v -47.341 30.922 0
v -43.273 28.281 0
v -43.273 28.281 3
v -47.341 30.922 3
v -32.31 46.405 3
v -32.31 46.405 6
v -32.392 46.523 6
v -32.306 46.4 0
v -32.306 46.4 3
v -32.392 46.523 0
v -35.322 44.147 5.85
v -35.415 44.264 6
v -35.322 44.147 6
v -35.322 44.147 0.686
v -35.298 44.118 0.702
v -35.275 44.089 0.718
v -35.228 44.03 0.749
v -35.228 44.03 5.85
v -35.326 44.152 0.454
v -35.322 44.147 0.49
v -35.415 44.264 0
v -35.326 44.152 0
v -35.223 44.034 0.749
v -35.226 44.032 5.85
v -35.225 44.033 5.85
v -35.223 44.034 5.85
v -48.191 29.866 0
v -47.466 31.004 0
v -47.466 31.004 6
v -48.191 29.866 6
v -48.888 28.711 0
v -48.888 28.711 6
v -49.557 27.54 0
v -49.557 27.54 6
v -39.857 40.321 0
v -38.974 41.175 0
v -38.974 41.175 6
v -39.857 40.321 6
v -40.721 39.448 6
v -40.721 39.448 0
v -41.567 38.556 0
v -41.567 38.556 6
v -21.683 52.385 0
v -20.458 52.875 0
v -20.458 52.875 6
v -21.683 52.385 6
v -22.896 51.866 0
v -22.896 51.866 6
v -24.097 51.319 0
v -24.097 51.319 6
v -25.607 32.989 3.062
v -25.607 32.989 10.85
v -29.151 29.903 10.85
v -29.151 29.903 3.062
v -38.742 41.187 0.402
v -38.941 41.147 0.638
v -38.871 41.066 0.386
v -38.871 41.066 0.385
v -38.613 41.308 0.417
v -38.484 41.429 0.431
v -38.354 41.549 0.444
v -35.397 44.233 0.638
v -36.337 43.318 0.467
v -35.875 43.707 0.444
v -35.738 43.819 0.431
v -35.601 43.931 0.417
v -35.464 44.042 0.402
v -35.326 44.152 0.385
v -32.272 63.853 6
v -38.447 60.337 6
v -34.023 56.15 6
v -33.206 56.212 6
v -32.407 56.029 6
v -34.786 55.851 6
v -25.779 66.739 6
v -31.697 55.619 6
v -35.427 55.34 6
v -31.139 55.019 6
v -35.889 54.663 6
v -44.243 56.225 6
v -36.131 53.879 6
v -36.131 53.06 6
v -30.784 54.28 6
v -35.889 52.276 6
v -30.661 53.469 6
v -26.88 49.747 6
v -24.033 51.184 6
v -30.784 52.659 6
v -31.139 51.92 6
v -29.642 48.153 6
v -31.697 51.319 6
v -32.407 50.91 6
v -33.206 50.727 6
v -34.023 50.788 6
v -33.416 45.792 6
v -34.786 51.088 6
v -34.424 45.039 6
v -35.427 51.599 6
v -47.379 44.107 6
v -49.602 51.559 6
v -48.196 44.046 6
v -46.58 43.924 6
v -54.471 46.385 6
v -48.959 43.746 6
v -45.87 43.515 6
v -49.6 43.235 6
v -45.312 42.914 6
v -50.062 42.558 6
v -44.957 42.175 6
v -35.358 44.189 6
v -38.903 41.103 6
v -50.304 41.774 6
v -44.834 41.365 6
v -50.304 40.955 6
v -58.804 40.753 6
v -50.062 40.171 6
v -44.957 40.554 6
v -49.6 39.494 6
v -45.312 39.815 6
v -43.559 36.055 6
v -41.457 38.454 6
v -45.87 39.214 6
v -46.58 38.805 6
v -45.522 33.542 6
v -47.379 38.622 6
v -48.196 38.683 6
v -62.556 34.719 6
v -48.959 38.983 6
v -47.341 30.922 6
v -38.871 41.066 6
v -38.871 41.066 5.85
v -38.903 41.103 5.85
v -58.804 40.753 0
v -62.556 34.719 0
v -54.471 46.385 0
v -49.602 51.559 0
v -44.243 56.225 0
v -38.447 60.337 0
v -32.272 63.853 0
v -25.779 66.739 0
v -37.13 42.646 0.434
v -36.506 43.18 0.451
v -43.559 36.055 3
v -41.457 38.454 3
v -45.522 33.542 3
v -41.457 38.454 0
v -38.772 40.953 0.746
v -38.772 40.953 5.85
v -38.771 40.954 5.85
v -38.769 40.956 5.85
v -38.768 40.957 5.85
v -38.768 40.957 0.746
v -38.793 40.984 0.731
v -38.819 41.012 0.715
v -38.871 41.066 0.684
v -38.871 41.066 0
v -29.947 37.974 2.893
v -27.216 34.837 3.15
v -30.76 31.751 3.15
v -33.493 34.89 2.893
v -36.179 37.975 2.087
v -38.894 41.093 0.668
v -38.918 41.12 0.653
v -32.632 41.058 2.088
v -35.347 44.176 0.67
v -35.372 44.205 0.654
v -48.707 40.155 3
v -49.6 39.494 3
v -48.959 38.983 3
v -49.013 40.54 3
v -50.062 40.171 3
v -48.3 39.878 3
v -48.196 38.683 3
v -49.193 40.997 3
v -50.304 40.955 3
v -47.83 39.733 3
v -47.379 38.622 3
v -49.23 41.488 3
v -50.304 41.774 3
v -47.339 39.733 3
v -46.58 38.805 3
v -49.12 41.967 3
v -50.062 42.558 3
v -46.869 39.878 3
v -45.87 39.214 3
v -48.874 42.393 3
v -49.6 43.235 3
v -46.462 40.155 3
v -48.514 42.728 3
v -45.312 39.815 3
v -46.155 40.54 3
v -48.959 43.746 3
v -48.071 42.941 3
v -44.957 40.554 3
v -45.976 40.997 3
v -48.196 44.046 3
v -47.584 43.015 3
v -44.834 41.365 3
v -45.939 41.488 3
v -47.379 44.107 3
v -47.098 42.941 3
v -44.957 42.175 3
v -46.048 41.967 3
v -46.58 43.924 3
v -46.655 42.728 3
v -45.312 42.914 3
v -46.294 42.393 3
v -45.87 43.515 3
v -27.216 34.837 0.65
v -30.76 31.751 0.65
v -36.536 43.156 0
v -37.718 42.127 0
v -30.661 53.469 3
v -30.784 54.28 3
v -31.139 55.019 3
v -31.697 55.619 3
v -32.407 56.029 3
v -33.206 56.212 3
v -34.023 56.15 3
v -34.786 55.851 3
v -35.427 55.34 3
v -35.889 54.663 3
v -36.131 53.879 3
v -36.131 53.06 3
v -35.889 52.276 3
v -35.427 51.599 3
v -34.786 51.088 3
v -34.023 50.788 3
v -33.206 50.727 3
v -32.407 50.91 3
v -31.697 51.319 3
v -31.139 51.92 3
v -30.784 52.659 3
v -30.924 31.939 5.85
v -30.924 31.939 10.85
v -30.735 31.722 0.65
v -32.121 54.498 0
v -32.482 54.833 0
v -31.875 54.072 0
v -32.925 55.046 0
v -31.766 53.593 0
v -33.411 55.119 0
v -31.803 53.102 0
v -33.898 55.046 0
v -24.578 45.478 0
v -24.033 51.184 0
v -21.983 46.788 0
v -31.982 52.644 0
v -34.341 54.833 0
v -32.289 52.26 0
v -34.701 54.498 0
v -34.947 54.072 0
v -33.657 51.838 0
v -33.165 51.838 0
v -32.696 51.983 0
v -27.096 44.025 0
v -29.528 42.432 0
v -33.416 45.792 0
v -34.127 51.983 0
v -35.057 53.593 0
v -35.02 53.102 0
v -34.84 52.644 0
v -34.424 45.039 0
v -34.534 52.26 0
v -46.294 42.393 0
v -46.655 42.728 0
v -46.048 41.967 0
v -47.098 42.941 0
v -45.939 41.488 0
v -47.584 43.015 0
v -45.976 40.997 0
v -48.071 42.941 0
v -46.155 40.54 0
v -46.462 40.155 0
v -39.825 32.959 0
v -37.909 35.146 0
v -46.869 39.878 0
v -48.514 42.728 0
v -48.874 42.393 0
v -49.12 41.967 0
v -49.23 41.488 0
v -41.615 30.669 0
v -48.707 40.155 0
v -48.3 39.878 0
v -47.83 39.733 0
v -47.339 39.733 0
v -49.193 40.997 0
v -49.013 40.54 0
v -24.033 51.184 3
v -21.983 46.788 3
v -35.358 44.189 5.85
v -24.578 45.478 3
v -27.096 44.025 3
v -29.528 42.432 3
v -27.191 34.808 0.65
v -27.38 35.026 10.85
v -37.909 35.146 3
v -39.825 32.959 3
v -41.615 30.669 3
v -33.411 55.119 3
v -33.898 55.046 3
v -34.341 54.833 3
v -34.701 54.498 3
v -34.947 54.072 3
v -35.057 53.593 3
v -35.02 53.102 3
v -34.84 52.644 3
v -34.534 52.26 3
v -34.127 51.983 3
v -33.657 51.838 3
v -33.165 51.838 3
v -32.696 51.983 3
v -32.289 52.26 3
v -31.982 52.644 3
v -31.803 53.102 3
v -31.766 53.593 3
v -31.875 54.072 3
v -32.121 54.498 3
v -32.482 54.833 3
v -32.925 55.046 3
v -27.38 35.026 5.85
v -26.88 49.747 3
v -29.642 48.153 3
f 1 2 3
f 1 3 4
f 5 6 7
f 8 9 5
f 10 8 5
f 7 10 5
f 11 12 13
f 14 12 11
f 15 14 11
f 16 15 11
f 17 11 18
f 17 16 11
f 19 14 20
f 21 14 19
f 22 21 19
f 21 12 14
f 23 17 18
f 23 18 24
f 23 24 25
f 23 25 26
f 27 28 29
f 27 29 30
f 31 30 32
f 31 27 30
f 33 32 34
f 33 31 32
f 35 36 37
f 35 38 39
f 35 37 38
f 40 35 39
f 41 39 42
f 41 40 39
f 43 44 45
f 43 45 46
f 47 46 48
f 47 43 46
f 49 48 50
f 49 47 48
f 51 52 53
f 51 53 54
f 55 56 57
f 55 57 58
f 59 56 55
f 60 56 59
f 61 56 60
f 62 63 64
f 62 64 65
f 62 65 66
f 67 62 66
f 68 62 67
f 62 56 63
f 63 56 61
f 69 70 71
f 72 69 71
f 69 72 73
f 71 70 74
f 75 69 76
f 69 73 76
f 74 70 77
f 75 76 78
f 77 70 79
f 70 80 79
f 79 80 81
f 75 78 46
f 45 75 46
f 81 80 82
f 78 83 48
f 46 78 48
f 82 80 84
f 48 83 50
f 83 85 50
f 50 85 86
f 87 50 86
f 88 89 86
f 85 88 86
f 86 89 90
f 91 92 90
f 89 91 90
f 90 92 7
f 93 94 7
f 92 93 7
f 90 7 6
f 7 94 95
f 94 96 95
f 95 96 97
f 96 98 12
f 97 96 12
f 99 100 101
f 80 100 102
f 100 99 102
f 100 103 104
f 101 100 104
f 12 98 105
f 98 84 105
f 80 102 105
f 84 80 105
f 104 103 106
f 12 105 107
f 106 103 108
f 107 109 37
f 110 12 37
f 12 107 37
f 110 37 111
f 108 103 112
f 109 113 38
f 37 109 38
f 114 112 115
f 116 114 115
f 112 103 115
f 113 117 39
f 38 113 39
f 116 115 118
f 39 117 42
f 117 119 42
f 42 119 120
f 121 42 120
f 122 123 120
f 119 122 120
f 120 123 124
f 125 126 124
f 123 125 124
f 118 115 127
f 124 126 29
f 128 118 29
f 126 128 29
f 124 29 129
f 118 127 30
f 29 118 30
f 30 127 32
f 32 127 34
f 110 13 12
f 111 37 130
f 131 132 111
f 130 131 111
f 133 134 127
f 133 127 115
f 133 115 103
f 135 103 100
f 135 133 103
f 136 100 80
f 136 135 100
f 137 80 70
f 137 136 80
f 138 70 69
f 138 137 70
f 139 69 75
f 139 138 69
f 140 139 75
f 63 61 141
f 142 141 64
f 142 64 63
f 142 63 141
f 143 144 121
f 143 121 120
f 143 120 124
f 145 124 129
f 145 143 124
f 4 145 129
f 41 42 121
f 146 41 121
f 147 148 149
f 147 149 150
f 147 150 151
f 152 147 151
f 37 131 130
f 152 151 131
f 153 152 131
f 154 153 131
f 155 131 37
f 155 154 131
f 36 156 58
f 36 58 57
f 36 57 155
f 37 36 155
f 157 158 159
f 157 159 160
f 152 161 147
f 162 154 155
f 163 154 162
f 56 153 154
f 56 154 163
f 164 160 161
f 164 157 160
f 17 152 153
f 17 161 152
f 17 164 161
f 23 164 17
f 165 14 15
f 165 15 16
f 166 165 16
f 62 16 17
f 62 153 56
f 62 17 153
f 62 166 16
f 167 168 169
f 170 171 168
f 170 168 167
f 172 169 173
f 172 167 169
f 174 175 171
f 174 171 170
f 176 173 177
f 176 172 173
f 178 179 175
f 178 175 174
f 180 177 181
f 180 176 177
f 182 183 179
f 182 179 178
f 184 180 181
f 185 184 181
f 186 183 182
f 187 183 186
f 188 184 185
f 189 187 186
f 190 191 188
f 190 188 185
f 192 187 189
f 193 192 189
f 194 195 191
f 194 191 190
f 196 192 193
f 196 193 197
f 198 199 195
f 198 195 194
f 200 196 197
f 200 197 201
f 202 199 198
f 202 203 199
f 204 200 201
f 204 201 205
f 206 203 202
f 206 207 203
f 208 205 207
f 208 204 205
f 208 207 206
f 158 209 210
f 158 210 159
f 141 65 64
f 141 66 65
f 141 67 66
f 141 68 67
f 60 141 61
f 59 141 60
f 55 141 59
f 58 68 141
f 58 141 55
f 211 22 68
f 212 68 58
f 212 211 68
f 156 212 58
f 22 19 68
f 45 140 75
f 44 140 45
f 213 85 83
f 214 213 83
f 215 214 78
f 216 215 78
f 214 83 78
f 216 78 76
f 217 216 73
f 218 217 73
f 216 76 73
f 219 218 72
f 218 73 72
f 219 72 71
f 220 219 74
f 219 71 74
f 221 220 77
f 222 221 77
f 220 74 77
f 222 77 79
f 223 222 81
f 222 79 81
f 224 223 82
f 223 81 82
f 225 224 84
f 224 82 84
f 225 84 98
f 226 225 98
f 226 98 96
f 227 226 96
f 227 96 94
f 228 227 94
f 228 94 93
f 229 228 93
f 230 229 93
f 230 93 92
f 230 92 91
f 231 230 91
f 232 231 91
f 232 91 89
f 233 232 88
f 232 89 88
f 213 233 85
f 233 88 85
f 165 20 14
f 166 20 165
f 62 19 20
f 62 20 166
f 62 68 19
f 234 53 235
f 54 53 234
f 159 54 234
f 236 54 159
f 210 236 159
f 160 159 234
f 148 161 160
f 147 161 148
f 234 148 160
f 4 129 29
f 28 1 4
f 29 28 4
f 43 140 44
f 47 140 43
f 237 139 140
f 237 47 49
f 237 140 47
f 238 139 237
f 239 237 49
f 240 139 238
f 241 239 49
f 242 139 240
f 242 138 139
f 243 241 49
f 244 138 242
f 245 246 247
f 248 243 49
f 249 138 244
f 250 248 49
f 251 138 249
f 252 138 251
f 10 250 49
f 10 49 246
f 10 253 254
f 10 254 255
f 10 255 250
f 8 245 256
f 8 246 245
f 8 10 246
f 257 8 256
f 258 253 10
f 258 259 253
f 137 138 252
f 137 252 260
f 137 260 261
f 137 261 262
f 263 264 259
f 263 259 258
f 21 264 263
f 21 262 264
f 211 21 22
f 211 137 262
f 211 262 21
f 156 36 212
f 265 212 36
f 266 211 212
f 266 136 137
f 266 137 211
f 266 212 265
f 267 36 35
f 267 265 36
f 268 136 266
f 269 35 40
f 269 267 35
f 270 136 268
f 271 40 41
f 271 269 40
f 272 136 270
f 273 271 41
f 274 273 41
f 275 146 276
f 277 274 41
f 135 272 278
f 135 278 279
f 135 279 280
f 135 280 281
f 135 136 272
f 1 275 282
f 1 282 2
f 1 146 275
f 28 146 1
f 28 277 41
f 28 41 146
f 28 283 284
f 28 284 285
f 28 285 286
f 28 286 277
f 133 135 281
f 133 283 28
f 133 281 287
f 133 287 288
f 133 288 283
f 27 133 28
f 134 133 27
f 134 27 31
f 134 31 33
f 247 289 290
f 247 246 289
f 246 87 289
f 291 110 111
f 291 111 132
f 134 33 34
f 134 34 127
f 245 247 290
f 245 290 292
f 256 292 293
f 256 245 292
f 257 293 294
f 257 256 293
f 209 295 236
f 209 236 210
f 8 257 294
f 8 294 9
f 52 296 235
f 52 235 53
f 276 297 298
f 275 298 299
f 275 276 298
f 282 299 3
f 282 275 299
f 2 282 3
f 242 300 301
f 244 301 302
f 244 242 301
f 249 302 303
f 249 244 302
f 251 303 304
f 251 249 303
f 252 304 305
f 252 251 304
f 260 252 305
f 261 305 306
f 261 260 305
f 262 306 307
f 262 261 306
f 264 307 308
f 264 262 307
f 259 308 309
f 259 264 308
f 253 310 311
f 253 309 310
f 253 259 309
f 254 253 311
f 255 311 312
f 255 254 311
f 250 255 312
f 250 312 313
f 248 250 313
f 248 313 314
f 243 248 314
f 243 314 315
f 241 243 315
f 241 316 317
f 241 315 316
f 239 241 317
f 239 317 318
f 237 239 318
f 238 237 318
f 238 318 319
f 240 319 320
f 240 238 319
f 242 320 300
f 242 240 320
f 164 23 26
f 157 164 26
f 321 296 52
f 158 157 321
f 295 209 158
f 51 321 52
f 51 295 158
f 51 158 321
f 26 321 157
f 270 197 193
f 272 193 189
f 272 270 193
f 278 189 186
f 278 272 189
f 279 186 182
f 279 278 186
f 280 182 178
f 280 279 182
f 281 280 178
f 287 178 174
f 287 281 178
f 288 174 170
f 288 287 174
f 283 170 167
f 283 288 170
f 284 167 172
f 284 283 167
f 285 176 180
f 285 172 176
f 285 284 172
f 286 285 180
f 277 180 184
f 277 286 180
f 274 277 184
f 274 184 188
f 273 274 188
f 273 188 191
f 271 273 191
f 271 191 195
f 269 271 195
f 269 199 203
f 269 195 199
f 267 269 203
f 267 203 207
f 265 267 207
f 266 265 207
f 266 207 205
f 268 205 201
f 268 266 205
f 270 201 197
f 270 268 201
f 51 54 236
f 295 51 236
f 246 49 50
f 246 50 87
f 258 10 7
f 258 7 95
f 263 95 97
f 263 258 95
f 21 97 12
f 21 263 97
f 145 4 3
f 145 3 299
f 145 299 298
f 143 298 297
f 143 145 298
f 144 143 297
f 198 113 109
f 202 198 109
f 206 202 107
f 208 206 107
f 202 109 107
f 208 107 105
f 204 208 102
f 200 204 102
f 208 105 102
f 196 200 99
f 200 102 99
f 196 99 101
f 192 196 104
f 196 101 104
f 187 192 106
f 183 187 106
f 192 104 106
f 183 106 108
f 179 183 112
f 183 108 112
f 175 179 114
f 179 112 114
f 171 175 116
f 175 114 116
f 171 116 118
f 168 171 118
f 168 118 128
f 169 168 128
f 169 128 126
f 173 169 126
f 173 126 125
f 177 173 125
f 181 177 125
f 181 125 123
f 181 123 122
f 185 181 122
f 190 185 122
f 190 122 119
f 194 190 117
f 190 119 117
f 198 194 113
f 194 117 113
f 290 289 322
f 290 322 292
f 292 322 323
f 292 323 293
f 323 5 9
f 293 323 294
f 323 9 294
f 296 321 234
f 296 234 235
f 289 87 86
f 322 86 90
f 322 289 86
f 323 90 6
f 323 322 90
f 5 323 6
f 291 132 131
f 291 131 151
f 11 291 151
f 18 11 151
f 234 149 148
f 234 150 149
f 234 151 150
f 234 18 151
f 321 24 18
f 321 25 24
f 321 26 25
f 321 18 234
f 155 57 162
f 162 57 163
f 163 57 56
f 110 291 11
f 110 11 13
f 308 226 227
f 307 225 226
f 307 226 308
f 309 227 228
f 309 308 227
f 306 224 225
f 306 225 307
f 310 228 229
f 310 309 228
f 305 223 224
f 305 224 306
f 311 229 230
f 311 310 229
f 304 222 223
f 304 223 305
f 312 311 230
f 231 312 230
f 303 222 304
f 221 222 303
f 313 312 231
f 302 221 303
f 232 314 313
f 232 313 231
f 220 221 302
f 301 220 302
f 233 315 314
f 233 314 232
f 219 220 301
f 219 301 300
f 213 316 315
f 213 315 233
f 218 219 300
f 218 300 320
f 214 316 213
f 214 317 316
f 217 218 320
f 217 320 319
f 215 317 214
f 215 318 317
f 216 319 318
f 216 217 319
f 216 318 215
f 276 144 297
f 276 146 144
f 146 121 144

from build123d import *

# Parameters (mm, degrees)
BOSS_EXTRUDE1_DEPTH      = 6
SKETCH4_R                = 1.65
CUT_EXTRUDE1_DEPTH       = 92.758963041
BOSS_EXTRUDE2_DEPTH      = 2.5
BOSS_EXTRUDE2_DEPTH_BACK = 2.5
FILLET1_R                = 0.1
BOSS_EXTRUDE3_DEPTH      = 3
SKETCH9_R                = 2.75
CUT_EXTRUDE2_DEPTH       = 3
TOLERANCECUT_DEPTH       = 93.220969961
TOLERANCECUT2_DEPTH      = 2.35
TOLERANCECUT2_DEPTH_BACK = 2.35
CUT_EXTRUDE_THIN1_DEPTH  = 10


with BuildPart() as part:
    # Sketch1 → Boss-Extrude1 (new body)
    with BuildSketch(Plane(origin=(0, 0, 0), x_dir=(0, 1, 0), z_dir=(0, 0, 1))):
        with BuildLine():
            Line((66.793011614, 25.63943495), (52.789305216, 20.263915707))
            ThreePointArc((52.789305216, 20.263915707), (42.645904251, 37.130363258), (27.335841873, 49.498371429))
            Line((27.335841873, 49.498371429), (34.587369472, 62.629073903))
            ThreePointArc((34.587369472, 62.629073903), (53.95881545, 46.980136869), (66.793011614, 25.63943495))
        make_face()
    extrude(amount=BOSS_EXTRUDE1_DEPTH)

    # Sketch4 → Cut-Extrude1 (cut, through all)
    with BuildSketch(Plane(origin=(0, 0, 0), x_dir=(0, 1, 0), z_dir=(0, 0, 1))):
        with Locations((41.364521778, 47.584439033)):
            Circle(SKETCH4_R)
        with Locations((53.469432463, 33.41140961)):
            Circle(SKETCH4_R)
    extrude(amount=CUT_EXTRUDE1_DEPTH, mode=Mode.SUBTRACT)

    # Sketch7 → Boss-Extrude2 (add, two sides: drawn at the far end of the back side and taken through both)
    with BuildSketch(Plane(origin=(0, 0, 0), x_dir=(0, 0, 1), z_dir=(-0.7541940799479068, -0.6566515741026824, 0)).offset(-BOSS_EXTRUDE2_DEPTH_BACK)):
        with BuildLine():
            Line((6, 41.545), (3, 41.545))
            Line((3, 41.545), (0.5, 44.045))
            Line((0.5, 44.045), (0.5, 44.295))
            Line((0.5, 44.295), (3, 44.295))
            ThreePointArc((3, 44.295), (2.368624388, 50.546249875), (0.5, 56.545))
            Line((0.5, 56.545), (6, 56.545))
            Line((6, 56.545), (6, 44.545))
            Line((6, 44.545), (11, 44.545))
            Line((11, 44.545), (11, 41.545))
            Line((11, 41.545), (6, 41.545))
        make_face()
    extrude(amount=BOSS_EXTRUDE2_DEPTH + BOSS_EXTRUDE2_DEPTH_BACK)

    # Fillet1
    fillet1_edges = [part.edges().sort_by_distance(p)[0] for p in [
        (-29.086381475, 33.407026771, 3),
        (-29.250544368, 33.595575291, 6),
        (-37.130363258, 42.645904251, 0.5),
    ]]
    fillet(fillet1_edges, radius=FILLET1_R)

    # Sketch8 → Boss-Extrude3 (add)
    with BuildSketch(Plane(origin=(0, 0, 0), x_dir=(0, 1, 0), z_dir=(0, 0, 1))):
        with BuildLine():
            ThreePointArc((38.56359727, 41.354395058), (34.812578122, 44.558068063), (30.796614235, 47.422627264))
            Line((30.796614235, 47.422627264), (28.07341906, 43.229274425))
            ThreePointArc((28.07341906, 43.229274425), (31.734270746, 40.618014295), (35.153605469, 37.69762655))
            Line((35.153605469, 37.69762655), (38.56359727, 41.354395058))
        make_face()
        with BuildLine():
            ThreePointArc((51.247173818, 23.89694961), (48.969406457, 28.2725), (46.318952344, 32.432879593))
            Line((46.318952344, 32.432879593), (42.223192123, 29.564997412))
            ThreePointArc((42.223192123, 29.564997412), (44.639279438, 25.7725), (46.715634883, 21.783858301))
            Line((46.715634883, 21.783858301), (51.247173818, 23.89694961))
        make_face()
    extrude(amount=BOSS_EXTRUDE3_DEPTH)

    # Sketch9 → Cut-Extrude2 (cut)
    with BuildSketch(Plane.XY.offset(6)):
        with Locations((-47.584439033, 41.364521778)):
            Circle(SKETCH9_R)
        with Locations((-33.41140961, 53.469432463)):
            Circle(SKETCH9_R)
    extrude(amount=-CUT_EXTRUDE2_DEPTH, mode=Mode.SUBTRACT)

    # Sketch10 → ToleranceCut (cut, through all)
    with BuildSketch(Plane(origin=(0, 0, 0), x_dir=(0, 1, 0), z_dir=(0, 0, 1))):
        with BuildLine():
            Line((38.453894214, 41.456694812), (35.14605375, 37.9094702))
            ThreePointArc((35.14605375, 37.9094702), (31.826619967, 40.736215908), (28.280796974, 43.273196641))
            Line((28.280796974, 43.273196641), (30.92241482, 47.340931409))
            Line((30.92241482, 47.340931409), (30.67081365, 47.50432312))
            Line((30.67081365, 47.50432312), (27.865803402, 43.184986115))
            ThreePointArc((27.865803402, 43.184986115), (31.641921524, 40.499812682), (35.160859486, 37.485463652))
            Line((35.160859486, 37.485463652), (38.673300325, 41.252095304))
            Line((38.673300325, 41.252095304), (38.453894214, 41.456694812))
        make_face()
        with BuildLine():
            Line((46.232915879, 32.5557524), (42.014103544, 29.601708201))
            ThreePointArc((42.014103544, 29.601708201), (44.509375628, 25.6975), (46.642883069, 21.584426886))
            Line((46.642883069, 21.584426886), (51.310566557, 23.761003442))
            Line((51.310566557, 23.761003442), (51.183781079, 24.032895778))
            Line((51.183781079, 24.032895778), (46.787991078, 21.983105237))
            ThreePointArc((46.787991078, 21.983105237), (44.769183249, 25.8475), (42.431923129, 29.528036247))
            Line((42.431923129, 29.528036247), (46.40498881, 32.310006787))
            Line((46.40498881, 32.310006787), (46.232915879, 32.5557524))
        make_face()
        Polygon((44.147333984, 35.321699097), (32.876124251, 25.508233558), (33.073119723, 25.281975334), (44.344329456, 35.095440873), align=None)
        Polygon((40.817854097, 39.052425533), (29.59286638, 29.279203958), (29.789861852, 29.052945734), (41.014849569, 38.826167309), align=None)
    extrude(amount=TOLERANCECUT_DEPTH, mode=Mode.SUBTRACT)

    # Sketch16 → ToleranceCut2 (cut, two sides: drawn at the far end of the back side and taken through both)
    with BuildSketch(Plane(origin=(0, 0, 0), x_dir=(0, 0, 1), z_dir=(-0.7541940799479068, -0.6566515741026824, 0)).offset(-TOLERANCECUT2_DEPTH_BACK)):
        with BuildLine():
            Line((5.85, 56.545), (5.85, 44.395))
            Line((5.85, 44.395), (10.85, 44.395))
            Line((10.85, 44.395), (10.85, 41.695))
            Line((10.85, 41.695), (6, 41.695))
            Line((6, 41.695), (3.062132034, 41.695))
            Line((3.062132034, 41.695), (0.65, 44.107132034))
            Line((0.65, 44.107132034), (0.65, 44.145))
            Line((0.65, 44.145), (3.14964186, 44.145))
            ThreePointArc((3.14964186, 44.145), (2.530504313, 50.50274046), (0.638004798, 56.603776489))
            Line((0.638004798, 56.603776489), (0.361995202, 56.486223511))
            ThreePointArc((0.361995202, 56.486223511), (2.206568162, 50.589723315), (2.849638407, 44.445))
            Line((2.849638407, 44.445), (0.35, 44.445))
            Line((0.35, 44.445), (0.35, 43.982867966))
            Line((0.35, 43.982867966), (2.937867966, 41.395))
            Line((2.937867966, 41.395), (6, 41.395))
            Line((6, 41.395), (11.15, 41.395))
            Line((11.15, 41.395), (11.15, 44.695))
            Line((11.15, 44.695), (6.15, 44.695))
            Line((6.15, 44.695), (6.15, 56.545))
            Line((6.15, 56.545), (5.85, 56.545))
        make_face()
    extrude(amount=TOLERANCECUT2_DEPTH + TOLERANCECUT2_DEPTH_BACK, mode=Mode.SUBTRACT)

    # Sketch17 → Cut-Extrude-Thin1 (cut)
    with BuildSketch(Plane(origin=(0, 0, 0), x_dir=(0, 1, 0), z_dir=(0, 0, 1))):
        with BuildLine():
            ThreePointArc((51.047913396, 23.969100589), (51.912040519, 22.035137719), (52.70292998, 20.070087611))
            Line((52.70292998, 20.070087611), (66.846766806, 25.499397886))
            Line((66.846766806, 25.499397886), (66.739256421, 25.779472014))
            Line((66.739256421, 25.779472014), (52.875494708, 20.457672502))
            ThreePointArc((52.875494708, 20.457672502), (52.129243688, 22.290721328), (51.319468445, 24.096606884))
            Line((51.319468445, 24.096606884), (51.047913396, 23.969100589))
        make_face()
        with BuildLine():
            ThreePointArc((31.004335746, 47.466347973), (29.290610597, 48.542591153), (27.539568245, 49.556989475))
            Line((27.539568245, 49.556989475), (34.718676497, 62.556558627))
            Line((34.718676497, 62.556558627), (34.456062447, 62.701589179))
            Line((34.456062447, 62.701589179), (27.131923134, 49.439405054))
            ThreePointArc((27.131923134, 49.439405054), (29.007426552, 48.362849687), (30.840277175, 47.215181126))
            Line((30.840277175, 47.215181126), (31.004335746, 47.466347973))
        make_face()
        with BuildLine():
            ThreePointArc((38.351817991, 41.346648013), (39.675403143, 40.078293758), (40.957064996, 38.767590486))
            Line((40.957064996, 38.767590486), (41.174940656, 38.973818992))
            ThreePointArc((41.174940656, 38.973818992), (39.88646086, 40.291494696), (38.55583475, 41.566596103))
            Line((38.55583475, 41.566596103), (38.351817991, 41.346648013))
        make_face()
        with BuildLine():
            ThreePointArc((44.030208622, 35.227988641), (45.178364811, 33.742937157), (46.276455334, 32.220492496))
            Line((46.276455334, 32.220492496), (46.522656602, 32.391912844))
            ThreePointArc((46.522656602, 32.391912844), (45.418723987, 33.922457258), (44.264459346, 35.415409553))
            Line((44.264459346, 35.415409553), (44.030208622, 35.227988641))
        make_face()
    extrude(amount=CUT_EXTRUDE_THIN1_DEPTH, mode=Mode.SUBTRACT)


solid = part.part
